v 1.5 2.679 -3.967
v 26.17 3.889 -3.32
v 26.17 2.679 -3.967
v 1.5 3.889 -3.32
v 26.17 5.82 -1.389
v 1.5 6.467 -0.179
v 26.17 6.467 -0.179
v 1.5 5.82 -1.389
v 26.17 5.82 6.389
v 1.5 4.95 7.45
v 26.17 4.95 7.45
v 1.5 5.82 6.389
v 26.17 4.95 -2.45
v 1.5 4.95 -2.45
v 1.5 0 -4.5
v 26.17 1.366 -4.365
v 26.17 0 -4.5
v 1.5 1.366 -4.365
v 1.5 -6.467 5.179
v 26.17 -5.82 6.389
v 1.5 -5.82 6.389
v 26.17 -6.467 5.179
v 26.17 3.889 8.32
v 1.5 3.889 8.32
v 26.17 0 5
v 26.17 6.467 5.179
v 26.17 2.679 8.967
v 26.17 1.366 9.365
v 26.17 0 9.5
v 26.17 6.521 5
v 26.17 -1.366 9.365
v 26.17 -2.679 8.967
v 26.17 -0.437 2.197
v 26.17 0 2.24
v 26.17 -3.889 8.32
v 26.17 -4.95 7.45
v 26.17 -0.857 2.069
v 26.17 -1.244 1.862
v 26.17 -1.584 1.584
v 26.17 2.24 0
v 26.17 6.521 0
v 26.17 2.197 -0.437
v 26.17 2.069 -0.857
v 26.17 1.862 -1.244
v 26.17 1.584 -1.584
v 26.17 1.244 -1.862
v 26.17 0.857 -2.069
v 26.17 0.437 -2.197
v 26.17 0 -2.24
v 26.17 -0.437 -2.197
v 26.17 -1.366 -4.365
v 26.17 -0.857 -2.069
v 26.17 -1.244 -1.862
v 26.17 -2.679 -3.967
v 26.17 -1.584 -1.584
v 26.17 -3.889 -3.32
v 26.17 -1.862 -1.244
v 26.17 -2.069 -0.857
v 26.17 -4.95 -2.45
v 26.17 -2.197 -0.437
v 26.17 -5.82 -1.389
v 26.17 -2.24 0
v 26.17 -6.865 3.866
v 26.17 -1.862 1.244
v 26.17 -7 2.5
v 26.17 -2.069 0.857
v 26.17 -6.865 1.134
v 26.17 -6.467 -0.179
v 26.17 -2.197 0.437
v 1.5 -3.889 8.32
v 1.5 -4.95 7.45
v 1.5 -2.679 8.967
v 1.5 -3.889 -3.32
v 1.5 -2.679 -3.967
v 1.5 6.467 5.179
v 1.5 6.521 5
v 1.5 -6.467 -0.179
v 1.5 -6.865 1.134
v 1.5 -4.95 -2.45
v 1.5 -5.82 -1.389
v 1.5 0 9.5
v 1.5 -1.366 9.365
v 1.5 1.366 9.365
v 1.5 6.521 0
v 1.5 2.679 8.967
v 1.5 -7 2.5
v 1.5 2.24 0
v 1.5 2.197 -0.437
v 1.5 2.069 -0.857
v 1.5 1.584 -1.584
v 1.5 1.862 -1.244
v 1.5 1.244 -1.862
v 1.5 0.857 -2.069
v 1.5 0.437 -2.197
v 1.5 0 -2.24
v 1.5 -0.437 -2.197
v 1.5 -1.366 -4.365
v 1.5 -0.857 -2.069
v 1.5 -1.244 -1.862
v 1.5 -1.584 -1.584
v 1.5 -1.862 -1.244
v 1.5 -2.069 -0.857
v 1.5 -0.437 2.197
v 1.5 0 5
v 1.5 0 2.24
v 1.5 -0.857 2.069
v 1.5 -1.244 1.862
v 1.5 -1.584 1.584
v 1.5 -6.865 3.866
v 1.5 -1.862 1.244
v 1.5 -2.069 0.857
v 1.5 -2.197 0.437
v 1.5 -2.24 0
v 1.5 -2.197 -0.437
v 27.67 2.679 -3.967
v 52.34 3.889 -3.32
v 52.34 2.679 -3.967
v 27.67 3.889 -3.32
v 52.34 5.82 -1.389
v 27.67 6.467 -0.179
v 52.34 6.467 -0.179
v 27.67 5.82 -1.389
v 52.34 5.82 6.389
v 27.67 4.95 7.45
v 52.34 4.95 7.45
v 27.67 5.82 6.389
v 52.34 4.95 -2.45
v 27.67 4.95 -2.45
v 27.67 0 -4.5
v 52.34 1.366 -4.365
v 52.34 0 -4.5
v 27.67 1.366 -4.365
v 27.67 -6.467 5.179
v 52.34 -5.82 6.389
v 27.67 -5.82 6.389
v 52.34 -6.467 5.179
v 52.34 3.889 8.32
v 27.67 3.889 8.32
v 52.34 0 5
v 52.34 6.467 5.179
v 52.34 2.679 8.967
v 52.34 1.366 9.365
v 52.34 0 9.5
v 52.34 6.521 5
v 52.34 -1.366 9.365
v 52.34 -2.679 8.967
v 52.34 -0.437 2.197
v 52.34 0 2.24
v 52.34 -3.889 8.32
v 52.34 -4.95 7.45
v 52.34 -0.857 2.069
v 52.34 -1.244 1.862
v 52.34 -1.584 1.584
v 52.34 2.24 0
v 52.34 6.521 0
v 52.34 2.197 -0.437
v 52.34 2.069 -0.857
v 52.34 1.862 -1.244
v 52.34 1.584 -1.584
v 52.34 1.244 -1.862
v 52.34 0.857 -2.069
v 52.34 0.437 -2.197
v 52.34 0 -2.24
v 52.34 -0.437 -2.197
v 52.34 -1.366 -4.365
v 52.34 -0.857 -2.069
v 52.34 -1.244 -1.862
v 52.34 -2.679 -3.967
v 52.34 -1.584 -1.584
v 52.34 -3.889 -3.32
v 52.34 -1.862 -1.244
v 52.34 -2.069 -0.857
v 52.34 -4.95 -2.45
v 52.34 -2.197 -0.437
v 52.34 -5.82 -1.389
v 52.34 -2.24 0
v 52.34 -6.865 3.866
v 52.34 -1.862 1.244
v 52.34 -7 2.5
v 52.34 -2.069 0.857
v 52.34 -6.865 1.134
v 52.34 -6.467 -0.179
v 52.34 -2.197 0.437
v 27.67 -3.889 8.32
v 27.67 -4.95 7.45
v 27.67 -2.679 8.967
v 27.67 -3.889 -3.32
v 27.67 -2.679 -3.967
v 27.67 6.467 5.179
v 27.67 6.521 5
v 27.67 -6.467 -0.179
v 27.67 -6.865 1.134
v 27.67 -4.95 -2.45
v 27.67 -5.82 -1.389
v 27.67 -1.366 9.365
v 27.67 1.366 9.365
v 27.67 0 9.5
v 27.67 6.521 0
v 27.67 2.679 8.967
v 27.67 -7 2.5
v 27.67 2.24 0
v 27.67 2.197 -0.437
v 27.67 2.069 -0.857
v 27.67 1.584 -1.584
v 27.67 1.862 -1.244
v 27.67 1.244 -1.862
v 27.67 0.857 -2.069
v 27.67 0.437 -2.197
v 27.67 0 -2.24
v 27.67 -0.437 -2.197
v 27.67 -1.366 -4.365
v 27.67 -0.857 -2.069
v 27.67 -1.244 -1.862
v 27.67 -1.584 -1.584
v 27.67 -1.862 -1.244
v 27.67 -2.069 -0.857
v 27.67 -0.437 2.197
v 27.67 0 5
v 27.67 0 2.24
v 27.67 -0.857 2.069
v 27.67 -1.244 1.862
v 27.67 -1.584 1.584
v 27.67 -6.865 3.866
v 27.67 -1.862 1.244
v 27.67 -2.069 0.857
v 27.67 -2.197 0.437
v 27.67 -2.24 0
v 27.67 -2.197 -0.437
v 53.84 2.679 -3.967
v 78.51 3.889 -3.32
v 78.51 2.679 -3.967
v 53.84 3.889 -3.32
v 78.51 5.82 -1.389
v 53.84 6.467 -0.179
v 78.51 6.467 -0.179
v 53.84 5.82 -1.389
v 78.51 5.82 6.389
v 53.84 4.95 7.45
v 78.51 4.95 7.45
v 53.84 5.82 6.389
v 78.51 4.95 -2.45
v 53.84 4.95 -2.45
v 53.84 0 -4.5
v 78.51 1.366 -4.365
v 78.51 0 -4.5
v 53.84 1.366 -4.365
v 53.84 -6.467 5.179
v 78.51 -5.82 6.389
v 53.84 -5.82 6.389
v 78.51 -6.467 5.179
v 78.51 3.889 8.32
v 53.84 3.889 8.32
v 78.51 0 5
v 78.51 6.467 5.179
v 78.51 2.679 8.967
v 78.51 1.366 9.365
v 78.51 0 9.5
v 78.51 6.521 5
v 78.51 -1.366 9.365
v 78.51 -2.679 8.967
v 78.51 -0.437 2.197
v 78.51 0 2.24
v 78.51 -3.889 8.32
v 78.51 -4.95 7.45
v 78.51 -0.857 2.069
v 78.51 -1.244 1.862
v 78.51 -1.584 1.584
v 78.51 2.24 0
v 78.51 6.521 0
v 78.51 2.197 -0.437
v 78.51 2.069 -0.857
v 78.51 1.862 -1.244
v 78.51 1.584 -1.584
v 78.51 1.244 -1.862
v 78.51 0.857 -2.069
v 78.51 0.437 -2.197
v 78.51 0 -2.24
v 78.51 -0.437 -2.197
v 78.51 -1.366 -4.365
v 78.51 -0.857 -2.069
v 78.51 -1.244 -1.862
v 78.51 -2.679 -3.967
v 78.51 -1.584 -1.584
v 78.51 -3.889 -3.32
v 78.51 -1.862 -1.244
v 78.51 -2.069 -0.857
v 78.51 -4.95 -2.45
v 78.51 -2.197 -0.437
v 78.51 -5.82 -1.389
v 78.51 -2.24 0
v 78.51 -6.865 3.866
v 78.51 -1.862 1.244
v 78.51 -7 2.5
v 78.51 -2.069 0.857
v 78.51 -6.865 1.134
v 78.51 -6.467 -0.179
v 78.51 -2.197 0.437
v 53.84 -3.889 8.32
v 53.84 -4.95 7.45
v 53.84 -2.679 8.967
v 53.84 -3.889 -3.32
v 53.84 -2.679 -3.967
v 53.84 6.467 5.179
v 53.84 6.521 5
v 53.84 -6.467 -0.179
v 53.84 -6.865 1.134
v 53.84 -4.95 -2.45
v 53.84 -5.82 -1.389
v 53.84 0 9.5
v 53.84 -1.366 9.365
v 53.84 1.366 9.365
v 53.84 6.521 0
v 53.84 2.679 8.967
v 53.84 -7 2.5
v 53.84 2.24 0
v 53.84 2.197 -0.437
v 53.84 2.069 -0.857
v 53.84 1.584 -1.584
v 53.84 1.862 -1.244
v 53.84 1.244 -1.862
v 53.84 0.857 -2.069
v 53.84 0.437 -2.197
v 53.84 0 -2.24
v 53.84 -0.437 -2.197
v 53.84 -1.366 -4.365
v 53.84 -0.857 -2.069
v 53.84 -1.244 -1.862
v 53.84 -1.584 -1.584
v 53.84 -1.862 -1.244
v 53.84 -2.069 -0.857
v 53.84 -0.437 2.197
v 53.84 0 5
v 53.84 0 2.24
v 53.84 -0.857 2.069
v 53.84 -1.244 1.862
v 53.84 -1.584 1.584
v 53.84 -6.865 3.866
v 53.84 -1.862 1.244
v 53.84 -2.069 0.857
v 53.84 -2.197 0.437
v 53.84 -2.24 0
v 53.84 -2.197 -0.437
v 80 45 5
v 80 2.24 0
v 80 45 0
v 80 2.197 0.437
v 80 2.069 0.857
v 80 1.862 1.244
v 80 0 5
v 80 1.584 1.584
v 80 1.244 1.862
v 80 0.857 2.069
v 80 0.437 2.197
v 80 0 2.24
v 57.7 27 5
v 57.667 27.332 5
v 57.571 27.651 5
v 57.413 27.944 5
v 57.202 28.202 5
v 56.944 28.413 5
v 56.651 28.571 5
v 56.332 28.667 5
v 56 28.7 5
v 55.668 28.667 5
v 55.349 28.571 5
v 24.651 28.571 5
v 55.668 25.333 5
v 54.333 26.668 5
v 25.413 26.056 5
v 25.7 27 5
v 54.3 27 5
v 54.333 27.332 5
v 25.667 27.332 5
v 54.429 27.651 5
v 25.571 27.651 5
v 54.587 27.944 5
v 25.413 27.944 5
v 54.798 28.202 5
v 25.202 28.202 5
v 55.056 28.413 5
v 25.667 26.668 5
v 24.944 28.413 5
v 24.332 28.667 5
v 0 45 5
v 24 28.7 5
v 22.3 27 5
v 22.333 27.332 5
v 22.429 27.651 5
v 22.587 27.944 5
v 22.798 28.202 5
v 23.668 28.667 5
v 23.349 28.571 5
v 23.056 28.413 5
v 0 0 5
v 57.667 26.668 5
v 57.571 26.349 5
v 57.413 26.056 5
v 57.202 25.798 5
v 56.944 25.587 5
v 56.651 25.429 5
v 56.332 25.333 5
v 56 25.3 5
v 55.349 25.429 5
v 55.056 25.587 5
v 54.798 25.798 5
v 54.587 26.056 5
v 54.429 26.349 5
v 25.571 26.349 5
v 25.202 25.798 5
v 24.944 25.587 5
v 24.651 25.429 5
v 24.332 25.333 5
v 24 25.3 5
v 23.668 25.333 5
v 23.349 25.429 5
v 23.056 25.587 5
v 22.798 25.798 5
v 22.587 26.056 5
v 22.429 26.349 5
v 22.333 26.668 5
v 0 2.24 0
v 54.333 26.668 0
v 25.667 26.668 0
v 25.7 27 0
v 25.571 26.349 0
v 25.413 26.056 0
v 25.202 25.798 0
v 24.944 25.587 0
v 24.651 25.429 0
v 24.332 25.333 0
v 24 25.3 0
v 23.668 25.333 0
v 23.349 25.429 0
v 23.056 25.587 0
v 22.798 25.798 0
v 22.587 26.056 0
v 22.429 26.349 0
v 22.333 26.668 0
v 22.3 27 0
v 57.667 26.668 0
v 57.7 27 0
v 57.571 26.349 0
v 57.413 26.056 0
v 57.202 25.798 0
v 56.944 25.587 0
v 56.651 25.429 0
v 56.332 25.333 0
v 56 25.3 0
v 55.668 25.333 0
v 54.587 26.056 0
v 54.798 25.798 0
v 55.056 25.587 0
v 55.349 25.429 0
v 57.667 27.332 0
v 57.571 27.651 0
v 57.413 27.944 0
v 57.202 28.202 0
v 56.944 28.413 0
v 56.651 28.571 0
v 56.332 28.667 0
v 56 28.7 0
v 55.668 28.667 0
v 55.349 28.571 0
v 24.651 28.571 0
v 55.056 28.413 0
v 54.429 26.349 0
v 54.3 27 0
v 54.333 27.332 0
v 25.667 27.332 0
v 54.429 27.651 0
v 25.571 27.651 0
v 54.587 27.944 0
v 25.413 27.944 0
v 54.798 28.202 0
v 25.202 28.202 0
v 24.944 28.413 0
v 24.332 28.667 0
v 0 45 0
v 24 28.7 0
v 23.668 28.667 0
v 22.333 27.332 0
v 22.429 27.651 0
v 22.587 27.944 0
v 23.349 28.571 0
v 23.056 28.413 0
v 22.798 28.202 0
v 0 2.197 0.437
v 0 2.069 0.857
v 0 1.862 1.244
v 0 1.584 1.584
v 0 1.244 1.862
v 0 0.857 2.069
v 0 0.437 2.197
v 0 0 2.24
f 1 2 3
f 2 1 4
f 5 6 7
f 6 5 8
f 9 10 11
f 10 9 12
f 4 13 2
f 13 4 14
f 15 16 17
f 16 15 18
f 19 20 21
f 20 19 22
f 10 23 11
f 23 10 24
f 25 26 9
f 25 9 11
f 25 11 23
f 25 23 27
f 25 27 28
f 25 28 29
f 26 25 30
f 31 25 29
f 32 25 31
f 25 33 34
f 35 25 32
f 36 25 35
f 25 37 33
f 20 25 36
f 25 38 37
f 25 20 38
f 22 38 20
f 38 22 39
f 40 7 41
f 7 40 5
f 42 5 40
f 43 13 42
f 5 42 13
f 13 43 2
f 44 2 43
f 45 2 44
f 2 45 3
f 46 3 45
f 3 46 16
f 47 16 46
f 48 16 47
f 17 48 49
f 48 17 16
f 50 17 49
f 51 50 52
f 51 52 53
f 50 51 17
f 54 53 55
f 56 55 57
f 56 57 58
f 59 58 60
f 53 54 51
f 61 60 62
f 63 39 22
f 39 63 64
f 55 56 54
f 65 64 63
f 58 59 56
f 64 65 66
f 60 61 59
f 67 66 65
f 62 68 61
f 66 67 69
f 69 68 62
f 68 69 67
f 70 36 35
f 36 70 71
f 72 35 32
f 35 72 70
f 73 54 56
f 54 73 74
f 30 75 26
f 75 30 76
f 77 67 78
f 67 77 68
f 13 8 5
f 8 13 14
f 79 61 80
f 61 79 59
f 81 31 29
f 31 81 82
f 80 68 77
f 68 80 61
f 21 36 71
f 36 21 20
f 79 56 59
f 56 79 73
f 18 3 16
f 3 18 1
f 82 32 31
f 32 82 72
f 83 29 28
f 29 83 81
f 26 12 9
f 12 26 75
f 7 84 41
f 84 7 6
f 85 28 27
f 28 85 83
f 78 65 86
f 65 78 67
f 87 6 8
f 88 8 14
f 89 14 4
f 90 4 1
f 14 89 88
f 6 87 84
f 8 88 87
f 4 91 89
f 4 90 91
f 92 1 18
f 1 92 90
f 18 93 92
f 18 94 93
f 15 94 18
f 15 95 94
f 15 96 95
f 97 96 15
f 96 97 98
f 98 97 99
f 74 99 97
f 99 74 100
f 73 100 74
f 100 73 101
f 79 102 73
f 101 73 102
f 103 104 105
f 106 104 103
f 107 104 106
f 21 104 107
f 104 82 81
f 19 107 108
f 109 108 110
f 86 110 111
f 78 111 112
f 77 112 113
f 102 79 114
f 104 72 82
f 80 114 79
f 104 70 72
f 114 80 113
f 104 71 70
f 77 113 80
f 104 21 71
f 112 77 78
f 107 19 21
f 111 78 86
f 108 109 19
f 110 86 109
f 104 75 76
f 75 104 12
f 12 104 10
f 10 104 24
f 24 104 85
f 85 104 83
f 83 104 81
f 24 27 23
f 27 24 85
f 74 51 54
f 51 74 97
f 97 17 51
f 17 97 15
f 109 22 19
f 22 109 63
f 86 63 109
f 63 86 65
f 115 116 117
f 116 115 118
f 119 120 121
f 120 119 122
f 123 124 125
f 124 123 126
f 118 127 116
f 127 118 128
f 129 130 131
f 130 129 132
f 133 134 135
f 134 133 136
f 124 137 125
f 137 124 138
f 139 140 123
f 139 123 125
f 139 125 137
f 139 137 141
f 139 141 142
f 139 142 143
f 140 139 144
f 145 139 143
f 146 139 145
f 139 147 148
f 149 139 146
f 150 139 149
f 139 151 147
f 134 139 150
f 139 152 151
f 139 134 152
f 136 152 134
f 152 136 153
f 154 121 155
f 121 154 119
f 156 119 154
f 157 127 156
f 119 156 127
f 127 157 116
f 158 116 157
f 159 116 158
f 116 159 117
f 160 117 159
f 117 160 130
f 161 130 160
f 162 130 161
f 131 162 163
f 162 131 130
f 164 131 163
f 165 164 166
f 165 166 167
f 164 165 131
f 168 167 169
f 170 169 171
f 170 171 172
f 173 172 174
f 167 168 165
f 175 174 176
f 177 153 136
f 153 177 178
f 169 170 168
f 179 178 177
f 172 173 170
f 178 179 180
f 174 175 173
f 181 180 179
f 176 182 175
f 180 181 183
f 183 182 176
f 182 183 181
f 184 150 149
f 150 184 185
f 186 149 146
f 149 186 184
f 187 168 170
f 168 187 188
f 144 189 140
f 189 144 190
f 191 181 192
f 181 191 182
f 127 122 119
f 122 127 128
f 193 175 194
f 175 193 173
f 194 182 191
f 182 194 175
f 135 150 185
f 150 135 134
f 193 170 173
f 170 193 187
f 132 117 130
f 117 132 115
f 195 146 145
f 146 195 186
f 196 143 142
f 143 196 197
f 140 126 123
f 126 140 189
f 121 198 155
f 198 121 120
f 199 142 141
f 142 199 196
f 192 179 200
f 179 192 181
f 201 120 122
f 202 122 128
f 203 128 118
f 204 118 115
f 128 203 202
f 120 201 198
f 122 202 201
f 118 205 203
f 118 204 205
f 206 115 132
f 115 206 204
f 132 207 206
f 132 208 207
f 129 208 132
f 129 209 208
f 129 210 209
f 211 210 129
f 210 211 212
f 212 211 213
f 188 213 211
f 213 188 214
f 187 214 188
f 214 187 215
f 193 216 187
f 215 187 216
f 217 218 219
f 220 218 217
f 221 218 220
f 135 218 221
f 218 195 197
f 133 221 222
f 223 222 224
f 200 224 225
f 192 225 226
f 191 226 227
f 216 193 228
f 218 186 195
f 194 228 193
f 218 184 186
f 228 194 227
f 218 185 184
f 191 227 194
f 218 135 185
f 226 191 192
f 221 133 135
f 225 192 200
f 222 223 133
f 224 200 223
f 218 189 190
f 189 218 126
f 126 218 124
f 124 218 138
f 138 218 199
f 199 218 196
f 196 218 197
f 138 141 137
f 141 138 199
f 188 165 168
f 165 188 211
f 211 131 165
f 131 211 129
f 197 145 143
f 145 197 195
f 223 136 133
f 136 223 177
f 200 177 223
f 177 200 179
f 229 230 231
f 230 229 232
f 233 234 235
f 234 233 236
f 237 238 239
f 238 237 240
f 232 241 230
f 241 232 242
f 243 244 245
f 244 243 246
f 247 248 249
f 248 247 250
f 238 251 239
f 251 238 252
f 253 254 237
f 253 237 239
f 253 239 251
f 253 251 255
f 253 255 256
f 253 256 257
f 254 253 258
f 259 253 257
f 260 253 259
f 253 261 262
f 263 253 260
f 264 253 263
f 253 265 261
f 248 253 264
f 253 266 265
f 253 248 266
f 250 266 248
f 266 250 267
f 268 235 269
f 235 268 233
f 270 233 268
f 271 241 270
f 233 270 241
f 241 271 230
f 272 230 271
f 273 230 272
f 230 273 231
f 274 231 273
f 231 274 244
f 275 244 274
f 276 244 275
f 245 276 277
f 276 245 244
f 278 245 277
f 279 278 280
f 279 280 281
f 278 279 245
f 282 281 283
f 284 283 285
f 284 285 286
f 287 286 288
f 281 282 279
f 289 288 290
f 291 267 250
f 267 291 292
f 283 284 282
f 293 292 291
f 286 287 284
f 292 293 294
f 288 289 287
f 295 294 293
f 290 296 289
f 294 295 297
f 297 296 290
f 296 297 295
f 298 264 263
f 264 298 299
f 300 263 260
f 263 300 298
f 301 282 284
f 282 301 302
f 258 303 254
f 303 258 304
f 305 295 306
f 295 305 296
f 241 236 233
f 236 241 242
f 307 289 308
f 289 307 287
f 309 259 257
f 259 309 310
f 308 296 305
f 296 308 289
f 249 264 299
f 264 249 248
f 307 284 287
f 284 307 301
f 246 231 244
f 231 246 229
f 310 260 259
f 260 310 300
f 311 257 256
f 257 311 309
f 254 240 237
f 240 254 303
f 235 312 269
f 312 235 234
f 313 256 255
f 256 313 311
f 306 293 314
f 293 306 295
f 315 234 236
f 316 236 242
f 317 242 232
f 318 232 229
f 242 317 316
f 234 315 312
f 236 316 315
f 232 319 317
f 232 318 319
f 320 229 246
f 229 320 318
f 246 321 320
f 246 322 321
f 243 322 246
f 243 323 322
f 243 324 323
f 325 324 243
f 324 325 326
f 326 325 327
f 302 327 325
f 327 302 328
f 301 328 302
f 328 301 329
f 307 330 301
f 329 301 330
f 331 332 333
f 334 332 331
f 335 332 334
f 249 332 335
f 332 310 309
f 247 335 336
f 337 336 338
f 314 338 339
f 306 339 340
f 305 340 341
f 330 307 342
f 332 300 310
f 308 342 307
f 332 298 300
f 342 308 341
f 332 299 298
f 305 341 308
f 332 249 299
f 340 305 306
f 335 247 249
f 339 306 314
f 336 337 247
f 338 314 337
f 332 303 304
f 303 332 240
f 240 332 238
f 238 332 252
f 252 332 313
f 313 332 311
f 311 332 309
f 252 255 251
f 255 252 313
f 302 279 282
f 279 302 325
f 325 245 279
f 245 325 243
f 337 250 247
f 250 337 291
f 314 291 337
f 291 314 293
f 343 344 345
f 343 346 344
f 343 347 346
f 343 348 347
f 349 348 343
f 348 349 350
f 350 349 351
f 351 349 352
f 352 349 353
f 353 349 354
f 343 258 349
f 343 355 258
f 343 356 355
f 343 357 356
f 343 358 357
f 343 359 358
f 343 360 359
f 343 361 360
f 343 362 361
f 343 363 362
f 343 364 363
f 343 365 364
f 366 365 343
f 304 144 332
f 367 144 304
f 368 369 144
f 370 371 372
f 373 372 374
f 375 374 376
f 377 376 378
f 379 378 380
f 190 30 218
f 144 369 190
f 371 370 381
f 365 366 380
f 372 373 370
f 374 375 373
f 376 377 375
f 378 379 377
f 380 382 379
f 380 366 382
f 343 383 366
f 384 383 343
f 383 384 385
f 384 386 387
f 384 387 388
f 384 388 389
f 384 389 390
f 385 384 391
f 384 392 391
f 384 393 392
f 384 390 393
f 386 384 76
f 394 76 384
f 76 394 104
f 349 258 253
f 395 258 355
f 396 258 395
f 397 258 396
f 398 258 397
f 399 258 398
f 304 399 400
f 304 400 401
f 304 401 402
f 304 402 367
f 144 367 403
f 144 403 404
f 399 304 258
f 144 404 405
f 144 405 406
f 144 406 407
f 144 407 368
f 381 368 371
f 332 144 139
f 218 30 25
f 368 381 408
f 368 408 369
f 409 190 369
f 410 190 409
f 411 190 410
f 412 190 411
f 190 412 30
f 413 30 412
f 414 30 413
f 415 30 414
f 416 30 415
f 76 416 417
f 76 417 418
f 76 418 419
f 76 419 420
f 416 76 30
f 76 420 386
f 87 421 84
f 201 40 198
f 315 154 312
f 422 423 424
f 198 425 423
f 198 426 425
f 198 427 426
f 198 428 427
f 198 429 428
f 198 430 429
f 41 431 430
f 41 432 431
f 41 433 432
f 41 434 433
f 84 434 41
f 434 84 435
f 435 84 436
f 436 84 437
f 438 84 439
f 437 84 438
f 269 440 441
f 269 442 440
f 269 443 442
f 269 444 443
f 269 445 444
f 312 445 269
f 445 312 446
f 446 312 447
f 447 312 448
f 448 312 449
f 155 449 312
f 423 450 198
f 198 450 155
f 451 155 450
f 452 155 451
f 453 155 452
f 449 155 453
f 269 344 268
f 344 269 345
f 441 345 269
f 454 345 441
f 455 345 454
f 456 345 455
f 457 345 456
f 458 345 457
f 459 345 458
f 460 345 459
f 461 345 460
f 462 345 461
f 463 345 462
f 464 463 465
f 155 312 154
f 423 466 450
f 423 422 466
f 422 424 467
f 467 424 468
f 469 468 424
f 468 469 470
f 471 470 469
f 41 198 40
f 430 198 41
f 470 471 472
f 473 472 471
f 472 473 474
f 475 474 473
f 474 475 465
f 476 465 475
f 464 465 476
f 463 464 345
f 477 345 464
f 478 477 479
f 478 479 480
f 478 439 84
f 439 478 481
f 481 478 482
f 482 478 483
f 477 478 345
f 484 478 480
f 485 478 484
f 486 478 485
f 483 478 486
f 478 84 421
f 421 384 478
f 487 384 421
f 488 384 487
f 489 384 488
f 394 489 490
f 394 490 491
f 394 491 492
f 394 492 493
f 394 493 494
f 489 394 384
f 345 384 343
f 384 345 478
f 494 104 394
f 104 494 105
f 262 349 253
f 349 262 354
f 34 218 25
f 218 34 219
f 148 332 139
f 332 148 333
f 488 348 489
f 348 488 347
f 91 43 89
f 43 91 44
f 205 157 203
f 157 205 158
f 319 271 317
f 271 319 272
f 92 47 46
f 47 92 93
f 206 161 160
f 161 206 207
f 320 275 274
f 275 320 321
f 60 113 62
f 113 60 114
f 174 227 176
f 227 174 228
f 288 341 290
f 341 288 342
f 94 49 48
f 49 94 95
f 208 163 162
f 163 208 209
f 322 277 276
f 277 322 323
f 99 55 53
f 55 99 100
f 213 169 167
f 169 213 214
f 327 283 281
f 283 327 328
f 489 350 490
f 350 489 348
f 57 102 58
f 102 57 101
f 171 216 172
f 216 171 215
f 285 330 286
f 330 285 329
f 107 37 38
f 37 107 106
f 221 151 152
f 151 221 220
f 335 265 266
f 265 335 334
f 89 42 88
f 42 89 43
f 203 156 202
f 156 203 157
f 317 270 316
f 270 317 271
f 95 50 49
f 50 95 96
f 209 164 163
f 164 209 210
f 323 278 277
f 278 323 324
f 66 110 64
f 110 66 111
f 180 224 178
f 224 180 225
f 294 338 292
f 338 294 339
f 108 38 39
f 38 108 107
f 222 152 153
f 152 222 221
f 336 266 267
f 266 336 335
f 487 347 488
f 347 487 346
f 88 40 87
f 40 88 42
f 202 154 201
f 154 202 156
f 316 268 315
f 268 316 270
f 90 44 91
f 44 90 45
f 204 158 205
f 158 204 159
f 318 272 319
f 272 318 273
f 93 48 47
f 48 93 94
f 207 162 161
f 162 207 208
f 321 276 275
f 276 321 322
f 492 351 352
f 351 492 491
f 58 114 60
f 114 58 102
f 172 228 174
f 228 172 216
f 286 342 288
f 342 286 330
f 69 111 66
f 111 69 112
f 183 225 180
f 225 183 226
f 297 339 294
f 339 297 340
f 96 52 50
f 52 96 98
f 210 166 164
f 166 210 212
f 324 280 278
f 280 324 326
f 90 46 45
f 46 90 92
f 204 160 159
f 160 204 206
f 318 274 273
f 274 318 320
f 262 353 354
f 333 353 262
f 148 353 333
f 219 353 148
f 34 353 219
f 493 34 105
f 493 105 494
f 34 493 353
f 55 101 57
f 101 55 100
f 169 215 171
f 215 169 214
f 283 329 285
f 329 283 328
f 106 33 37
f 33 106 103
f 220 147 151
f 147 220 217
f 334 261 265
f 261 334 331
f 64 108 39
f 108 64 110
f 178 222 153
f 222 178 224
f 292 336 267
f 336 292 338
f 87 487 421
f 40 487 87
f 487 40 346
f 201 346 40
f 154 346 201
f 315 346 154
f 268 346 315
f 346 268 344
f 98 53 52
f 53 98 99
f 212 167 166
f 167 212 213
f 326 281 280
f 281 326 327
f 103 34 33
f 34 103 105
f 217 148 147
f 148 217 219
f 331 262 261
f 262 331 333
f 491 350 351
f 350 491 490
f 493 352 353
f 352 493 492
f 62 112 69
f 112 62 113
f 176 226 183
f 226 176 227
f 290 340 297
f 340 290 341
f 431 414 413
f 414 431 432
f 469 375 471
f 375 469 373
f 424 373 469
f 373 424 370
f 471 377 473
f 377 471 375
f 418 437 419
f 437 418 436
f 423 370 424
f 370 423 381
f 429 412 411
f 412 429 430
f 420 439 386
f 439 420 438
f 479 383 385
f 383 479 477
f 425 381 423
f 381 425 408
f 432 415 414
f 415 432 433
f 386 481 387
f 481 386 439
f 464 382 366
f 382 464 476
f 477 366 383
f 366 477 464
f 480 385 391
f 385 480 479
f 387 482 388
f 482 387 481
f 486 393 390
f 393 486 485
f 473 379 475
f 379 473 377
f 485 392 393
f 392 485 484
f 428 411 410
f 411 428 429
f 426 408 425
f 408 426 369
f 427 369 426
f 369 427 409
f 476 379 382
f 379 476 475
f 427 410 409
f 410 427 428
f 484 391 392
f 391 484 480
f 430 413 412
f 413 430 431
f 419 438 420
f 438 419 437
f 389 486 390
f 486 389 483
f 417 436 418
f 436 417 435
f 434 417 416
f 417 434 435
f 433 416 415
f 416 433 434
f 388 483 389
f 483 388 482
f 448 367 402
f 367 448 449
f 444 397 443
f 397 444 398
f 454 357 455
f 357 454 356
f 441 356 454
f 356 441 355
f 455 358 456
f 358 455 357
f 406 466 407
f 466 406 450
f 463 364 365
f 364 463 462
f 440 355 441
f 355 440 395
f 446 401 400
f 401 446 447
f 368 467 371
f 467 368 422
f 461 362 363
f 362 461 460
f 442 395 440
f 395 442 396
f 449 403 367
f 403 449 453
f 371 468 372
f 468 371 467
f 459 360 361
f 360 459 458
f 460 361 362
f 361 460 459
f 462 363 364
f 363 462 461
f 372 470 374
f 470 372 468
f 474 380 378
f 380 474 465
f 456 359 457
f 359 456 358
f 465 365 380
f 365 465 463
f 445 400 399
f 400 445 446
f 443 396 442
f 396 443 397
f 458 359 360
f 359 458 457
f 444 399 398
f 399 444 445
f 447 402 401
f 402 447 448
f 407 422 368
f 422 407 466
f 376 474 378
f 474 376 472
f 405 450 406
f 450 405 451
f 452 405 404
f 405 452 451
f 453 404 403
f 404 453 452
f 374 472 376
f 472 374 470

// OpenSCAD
$fn = 32;

// ----------------------------------------------------------------------
// Hinge leaf: 80 x 52 x 14 mm
// ----------------------------------------------------------------------

// --- parameters (mm) ---
leaf_len = 80;            // leaf length, X
leaf_w = 45;              // leaf width, Y
leaf_t = 5;               // leaf thickness
knuckle_d = 14;           // knuckle diameter
knuckle_w = 24.67;        // knuckle width
knuckle_n = 3;            // number of knuckles
pin_d = 4.48;             // pin bore
gap = 1.5;                // gap between the knuckles
screw_d = 3.4;            // screw clearance

module leaf() {
  cube([leaf_len, leaf_w, leaf_t]);
}

module knuckles() {
  /* barrels sit on the leaf edge, the pin axis at half the leaf thickness */
  for (i = [0 : knuckle_n - 1])
    translate([gap + i * (knuckle_w + gap), 0, leaf_t * 0.5])
      rotate([0, 90, 0]) cylinder(h = knuckle_w, d = knuckle_d);
}

difference() {
  union() {
    leaf();
    knuckles();
  }
  rotate([0, 90, 0]) translate([0, 0, -1])
    cylinder(h = leaf_len + 2, d = pin_d);
  translate([24, leaf_w * 0.6, -1]) cylinder(h = leaf_t + 2, d = screw_d);
  translate([56, leaf_w * 0.6, -1]) cylinder(h = leaf_t + 2, d = screw_d);
}
